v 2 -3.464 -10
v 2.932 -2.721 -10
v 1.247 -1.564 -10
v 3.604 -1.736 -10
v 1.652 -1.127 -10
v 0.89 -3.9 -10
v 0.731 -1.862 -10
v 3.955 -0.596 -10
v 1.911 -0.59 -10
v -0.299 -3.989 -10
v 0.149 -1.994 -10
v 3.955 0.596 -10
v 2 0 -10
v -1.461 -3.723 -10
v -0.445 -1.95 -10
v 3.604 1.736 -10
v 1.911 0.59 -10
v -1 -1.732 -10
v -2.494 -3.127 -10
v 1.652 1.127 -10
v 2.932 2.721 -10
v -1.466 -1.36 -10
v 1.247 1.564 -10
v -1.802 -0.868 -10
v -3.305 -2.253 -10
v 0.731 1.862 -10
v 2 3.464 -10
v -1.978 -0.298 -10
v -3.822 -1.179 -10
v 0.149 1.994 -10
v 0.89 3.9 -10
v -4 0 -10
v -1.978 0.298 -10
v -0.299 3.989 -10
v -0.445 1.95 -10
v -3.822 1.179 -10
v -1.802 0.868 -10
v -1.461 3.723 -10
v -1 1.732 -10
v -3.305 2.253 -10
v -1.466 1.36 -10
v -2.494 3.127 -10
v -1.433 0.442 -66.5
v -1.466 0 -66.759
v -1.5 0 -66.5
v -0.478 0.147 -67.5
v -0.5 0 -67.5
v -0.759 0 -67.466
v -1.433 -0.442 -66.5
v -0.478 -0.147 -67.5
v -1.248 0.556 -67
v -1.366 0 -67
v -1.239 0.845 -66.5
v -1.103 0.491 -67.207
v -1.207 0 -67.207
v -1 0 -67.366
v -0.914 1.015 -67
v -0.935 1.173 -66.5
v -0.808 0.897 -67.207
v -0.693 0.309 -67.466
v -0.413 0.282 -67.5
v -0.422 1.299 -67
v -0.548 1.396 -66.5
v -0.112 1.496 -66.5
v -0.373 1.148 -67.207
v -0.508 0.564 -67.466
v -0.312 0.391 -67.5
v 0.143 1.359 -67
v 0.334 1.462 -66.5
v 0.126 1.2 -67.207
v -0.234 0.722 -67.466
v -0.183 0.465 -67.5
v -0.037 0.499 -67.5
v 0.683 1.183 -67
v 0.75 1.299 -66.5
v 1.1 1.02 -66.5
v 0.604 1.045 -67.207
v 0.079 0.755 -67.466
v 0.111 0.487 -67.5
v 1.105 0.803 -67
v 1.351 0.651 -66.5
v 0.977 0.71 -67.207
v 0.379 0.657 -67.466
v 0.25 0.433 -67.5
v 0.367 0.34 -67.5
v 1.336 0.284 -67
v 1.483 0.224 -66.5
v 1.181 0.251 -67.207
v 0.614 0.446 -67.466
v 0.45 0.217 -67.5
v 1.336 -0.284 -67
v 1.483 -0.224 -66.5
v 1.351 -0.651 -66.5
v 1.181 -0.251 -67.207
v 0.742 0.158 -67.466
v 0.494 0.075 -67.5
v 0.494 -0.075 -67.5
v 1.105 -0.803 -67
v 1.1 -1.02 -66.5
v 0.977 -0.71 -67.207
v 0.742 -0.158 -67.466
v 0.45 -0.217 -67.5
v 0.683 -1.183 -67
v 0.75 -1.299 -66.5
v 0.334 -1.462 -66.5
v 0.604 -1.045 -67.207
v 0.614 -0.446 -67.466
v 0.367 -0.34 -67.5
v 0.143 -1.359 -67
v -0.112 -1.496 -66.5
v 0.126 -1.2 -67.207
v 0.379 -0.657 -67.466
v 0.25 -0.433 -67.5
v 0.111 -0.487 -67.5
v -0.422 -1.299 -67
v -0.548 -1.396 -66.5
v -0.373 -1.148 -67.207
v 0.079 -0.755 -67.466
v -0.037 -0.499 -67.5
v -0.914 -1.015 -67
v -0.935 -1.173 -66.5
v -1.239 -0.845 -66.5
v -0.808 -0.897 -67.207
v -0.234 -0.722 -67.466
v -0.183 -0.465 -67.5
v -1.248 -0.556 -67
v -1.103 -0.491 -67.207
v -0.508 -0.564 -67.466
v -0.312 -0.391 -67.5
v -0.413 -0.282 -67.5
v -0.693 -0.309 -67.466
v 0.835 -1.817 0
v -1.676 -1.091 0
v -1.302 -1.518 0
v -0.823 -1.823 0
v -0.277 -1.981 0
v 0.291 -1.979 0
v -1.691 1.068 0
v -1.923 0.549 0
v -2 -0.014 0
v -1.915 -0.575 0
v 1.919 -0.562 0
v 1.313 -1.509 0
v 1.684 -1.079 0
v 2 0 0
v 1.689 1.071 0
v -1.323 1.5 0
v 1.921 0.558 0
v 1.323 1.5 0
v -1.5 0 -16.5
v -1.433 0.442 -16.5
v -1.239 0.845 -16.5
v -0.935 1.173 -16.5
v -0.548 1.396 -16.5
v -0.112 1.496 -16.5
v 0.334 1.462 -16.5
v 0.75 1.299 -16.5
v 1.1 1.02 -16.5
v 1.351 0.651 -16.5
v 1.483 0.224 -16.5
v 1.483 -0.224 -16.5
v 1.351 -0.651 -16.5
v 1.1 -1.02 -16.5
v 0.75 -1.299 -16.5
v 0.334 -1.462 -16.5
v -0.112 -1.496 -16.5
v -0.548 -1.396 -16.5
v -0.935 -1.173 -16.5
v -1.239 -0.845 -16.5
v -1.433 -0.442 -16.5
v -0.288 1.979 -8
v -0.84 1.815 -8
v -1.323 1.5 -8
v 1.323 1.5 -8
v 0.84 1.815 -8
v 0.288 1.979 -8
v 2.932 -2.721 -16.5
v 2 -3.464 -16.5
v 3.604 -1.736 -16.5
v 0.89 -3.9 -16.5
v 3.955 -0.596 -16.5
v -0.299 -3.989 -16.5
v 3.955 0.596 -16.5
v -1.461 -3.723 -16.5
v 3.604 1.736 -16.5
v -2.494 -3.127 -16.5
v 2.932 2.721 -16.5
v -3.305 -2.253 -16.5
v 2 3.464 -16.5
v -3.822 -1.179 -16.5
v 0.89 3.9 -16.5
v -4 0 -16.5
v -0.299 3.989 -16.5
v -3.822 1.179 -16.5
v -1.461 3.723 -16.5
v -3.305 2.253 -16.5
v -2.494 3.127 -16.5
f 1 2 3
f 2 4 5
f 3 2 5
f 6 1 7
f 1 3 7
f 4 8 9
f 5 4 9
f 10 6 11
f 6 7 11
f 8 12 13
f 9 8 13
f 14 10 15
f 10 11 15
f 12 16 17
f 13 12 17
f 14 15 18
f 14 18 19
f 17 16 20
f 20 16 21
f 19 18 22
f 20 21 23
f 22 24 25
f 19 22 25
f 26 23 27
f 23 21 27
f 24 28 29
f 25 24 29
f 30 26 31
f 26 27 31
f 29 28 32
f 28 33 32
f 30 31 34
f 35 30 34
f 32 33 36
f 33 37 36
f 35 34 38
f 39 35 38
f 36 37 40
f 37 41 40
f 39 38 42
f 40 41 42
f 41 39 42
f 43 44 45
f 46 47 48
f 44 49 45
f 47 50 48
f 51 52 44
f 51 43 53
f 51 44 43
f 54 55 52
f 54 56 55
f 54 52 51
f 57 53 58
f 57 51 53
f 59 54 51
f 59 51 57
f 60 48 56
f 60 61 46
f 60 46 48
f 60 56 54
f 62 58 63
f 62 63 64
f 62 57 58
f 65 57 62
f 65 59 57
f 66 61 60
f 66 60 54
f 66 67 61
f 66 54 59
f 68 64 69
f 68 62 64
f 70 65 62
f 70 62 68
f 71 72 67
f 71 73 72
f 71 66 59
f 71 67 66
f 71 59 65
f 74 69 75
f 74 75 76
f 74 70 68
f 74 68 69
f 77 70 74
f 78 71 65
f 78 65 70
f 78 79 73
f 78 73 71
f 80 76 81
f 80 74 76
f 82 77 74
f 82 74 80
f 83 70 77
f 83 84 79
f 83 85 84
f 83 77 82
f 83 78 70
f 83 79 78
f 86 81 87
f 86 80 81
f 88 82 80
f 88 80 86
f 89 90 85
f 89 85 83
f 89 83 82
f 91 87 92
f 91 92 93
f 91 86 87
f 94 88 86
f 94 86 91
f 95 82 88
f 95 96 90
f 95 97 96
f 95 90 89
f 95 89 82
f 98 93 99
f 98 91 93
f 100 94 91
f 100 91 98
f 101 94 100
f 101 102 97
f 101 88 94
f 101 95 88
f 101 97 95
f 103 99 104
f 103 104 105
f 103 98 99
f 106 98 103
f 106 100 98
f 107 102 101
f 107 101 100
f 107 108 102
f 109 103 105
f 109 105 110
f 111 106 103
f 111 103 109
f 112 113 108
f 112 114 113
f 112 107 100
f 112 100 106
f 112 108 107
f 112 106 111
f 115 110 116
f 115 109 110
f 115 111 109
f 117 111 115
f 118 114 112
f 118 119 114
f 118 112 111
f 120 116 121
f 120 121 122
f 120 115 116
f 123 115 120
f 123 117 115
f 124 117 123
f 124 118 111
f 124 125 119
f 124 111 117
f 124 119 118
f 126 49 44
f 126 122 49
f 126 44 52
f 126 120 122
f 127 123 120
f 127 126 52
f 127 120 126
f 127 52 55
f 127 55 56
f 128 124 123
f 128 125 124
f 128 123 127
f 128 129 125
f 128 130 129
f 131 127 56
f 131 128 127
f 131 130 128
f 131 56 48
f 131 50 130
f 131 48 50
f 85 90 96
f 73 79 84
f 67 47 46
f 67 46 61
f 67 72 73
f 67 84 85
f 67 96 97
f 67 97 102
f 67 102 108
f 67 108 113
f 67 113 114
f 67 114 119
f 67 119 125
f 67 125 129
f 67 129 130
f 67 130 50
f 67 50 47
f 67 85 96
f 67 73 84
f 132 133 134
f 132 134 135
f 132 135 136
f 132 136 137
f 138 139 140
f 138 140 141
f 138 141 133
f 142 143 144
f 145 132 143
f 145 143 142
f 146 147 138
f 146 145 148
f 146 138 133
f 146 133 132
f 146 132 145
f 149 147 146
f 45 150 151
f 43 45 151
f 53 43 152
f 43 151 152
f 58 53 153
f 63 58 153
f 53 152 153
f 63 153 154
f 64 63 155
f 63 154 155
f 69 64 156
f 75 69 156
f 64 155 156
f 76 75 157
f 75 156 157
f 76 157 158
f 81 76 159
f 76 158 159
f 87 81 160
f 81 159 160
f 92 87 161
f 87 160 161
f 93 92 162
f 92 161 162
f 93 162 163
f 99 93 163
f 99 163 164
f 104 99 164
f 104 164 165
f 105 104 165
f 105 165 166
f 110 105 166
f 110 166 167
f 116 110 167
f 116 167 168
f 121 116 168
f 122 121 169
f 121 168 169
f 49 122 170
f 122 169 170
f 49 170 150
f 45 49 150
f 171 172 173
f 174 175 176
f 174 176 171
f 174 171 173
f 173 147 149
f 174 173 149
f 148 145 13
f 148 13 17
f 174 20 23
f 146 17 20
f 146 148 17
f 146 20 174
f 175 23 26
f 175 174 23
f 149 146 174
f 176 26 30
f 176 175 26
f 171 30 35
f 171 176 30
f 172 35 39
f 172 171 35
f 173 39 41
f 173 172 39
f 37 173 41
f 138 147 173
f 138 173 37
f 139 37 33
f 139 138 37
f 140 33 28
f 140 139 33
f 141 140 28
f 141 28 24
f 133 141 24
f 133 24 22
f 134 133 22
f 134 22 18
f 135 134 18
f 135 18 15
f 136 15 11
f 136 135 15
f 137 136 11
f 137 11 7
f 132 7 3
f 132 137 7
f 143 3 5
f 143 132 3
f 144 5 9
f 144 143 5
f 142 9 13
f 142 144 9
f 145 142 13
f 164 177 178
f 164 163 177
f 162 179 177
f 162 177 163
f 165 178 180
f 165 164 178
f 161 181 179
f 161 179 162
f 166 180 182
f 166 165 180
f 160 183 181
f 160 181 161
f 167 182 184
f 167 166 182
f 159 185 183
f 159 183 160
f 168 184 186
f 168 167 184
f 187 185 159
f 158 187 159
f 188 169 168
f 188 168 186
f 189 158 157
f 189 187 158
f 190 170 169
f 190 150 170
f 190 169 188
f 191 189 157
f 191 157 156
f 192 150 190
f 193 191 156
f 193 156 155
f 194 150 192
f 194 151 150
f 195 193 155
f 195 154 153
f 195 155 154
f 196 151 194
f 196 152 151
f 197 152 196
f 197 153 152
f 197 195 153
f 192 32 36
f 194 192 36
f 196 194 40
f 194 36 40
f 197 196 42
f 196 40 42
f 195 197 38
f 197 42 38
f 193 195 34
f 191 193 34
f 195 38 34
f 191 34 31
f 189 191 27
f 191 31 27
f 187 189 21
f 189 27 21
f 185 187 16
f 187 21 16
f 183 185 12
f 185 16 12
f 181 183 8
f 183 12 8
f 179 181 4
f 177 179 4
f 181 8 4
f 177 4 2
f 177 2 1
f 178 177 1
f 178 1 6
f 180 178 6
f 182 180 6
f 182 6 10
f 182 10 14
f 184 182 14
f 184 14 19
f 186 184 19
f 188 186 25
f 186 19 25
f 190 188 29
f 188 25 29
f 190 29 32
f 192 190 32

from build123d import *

# Parameters (mm, degrees)
SKETCH1_R       = 2
EXTRUDE1_DEPTH  = 10
EXTRUDE2_DEPTH  = 8
SKETCH3_R       = 4
EXTRUDE3_DEPTH  = 6.5
SKETCH19_R      = 1.5
EXTRUDE13_DEPTH = 51
FILLET11_R      = 1


with BuildPart() as part:
    # Sketch1 → Extrude1 (new body)
    with BuildSketch(Plane.XY):
        Circle(SKETCH1_R)
    extrude(amount=-EXTRUDE1_DEPTH)

    # Sketch2 → Extrude2 (cut)
    with BuildSketch(Plane.XY):
        with BuildLine():
            Line((-1.322875656, 1.5), (1.322875656, 1.5))
            ThreePointArc((1.322875656, 1.5), (0, 2), (-1.322875656, 1.5))
        make_face()
    extrude(amount=-EXTRUDE2_DEPTH, mode=Mode.SUBTRACT)

    # Sketch3 → Extrude3 (add)
    with BuildSketch(Plane(origin=(0, 0, -10), x_dir=(-1, 0, 0), z_dir=(0, 0, -1))):
        Circle(SKETCH3_R)
    extrude(amount=EXTRUDE3_DEPTH)

    # Sketch19 → Extrude13 (add)
    with BuildSketch(Plane(origin=(0, 0, -16.5), x_dir=(-1, 0, 0), z_dir=(0, 0, -1))):
        Circle(SKETCH19_R)
    extrude(amount=EXTRUDE13_DEPTH)

    # Fillet11
    fillet11_edges = [part.edges().sort_by_distance(p)[0] for p in [
        (1.5, 0, -67.5),
    ]]
    fillet(fillet11_edges, radius=FILLET11_R)


solid = part.part
